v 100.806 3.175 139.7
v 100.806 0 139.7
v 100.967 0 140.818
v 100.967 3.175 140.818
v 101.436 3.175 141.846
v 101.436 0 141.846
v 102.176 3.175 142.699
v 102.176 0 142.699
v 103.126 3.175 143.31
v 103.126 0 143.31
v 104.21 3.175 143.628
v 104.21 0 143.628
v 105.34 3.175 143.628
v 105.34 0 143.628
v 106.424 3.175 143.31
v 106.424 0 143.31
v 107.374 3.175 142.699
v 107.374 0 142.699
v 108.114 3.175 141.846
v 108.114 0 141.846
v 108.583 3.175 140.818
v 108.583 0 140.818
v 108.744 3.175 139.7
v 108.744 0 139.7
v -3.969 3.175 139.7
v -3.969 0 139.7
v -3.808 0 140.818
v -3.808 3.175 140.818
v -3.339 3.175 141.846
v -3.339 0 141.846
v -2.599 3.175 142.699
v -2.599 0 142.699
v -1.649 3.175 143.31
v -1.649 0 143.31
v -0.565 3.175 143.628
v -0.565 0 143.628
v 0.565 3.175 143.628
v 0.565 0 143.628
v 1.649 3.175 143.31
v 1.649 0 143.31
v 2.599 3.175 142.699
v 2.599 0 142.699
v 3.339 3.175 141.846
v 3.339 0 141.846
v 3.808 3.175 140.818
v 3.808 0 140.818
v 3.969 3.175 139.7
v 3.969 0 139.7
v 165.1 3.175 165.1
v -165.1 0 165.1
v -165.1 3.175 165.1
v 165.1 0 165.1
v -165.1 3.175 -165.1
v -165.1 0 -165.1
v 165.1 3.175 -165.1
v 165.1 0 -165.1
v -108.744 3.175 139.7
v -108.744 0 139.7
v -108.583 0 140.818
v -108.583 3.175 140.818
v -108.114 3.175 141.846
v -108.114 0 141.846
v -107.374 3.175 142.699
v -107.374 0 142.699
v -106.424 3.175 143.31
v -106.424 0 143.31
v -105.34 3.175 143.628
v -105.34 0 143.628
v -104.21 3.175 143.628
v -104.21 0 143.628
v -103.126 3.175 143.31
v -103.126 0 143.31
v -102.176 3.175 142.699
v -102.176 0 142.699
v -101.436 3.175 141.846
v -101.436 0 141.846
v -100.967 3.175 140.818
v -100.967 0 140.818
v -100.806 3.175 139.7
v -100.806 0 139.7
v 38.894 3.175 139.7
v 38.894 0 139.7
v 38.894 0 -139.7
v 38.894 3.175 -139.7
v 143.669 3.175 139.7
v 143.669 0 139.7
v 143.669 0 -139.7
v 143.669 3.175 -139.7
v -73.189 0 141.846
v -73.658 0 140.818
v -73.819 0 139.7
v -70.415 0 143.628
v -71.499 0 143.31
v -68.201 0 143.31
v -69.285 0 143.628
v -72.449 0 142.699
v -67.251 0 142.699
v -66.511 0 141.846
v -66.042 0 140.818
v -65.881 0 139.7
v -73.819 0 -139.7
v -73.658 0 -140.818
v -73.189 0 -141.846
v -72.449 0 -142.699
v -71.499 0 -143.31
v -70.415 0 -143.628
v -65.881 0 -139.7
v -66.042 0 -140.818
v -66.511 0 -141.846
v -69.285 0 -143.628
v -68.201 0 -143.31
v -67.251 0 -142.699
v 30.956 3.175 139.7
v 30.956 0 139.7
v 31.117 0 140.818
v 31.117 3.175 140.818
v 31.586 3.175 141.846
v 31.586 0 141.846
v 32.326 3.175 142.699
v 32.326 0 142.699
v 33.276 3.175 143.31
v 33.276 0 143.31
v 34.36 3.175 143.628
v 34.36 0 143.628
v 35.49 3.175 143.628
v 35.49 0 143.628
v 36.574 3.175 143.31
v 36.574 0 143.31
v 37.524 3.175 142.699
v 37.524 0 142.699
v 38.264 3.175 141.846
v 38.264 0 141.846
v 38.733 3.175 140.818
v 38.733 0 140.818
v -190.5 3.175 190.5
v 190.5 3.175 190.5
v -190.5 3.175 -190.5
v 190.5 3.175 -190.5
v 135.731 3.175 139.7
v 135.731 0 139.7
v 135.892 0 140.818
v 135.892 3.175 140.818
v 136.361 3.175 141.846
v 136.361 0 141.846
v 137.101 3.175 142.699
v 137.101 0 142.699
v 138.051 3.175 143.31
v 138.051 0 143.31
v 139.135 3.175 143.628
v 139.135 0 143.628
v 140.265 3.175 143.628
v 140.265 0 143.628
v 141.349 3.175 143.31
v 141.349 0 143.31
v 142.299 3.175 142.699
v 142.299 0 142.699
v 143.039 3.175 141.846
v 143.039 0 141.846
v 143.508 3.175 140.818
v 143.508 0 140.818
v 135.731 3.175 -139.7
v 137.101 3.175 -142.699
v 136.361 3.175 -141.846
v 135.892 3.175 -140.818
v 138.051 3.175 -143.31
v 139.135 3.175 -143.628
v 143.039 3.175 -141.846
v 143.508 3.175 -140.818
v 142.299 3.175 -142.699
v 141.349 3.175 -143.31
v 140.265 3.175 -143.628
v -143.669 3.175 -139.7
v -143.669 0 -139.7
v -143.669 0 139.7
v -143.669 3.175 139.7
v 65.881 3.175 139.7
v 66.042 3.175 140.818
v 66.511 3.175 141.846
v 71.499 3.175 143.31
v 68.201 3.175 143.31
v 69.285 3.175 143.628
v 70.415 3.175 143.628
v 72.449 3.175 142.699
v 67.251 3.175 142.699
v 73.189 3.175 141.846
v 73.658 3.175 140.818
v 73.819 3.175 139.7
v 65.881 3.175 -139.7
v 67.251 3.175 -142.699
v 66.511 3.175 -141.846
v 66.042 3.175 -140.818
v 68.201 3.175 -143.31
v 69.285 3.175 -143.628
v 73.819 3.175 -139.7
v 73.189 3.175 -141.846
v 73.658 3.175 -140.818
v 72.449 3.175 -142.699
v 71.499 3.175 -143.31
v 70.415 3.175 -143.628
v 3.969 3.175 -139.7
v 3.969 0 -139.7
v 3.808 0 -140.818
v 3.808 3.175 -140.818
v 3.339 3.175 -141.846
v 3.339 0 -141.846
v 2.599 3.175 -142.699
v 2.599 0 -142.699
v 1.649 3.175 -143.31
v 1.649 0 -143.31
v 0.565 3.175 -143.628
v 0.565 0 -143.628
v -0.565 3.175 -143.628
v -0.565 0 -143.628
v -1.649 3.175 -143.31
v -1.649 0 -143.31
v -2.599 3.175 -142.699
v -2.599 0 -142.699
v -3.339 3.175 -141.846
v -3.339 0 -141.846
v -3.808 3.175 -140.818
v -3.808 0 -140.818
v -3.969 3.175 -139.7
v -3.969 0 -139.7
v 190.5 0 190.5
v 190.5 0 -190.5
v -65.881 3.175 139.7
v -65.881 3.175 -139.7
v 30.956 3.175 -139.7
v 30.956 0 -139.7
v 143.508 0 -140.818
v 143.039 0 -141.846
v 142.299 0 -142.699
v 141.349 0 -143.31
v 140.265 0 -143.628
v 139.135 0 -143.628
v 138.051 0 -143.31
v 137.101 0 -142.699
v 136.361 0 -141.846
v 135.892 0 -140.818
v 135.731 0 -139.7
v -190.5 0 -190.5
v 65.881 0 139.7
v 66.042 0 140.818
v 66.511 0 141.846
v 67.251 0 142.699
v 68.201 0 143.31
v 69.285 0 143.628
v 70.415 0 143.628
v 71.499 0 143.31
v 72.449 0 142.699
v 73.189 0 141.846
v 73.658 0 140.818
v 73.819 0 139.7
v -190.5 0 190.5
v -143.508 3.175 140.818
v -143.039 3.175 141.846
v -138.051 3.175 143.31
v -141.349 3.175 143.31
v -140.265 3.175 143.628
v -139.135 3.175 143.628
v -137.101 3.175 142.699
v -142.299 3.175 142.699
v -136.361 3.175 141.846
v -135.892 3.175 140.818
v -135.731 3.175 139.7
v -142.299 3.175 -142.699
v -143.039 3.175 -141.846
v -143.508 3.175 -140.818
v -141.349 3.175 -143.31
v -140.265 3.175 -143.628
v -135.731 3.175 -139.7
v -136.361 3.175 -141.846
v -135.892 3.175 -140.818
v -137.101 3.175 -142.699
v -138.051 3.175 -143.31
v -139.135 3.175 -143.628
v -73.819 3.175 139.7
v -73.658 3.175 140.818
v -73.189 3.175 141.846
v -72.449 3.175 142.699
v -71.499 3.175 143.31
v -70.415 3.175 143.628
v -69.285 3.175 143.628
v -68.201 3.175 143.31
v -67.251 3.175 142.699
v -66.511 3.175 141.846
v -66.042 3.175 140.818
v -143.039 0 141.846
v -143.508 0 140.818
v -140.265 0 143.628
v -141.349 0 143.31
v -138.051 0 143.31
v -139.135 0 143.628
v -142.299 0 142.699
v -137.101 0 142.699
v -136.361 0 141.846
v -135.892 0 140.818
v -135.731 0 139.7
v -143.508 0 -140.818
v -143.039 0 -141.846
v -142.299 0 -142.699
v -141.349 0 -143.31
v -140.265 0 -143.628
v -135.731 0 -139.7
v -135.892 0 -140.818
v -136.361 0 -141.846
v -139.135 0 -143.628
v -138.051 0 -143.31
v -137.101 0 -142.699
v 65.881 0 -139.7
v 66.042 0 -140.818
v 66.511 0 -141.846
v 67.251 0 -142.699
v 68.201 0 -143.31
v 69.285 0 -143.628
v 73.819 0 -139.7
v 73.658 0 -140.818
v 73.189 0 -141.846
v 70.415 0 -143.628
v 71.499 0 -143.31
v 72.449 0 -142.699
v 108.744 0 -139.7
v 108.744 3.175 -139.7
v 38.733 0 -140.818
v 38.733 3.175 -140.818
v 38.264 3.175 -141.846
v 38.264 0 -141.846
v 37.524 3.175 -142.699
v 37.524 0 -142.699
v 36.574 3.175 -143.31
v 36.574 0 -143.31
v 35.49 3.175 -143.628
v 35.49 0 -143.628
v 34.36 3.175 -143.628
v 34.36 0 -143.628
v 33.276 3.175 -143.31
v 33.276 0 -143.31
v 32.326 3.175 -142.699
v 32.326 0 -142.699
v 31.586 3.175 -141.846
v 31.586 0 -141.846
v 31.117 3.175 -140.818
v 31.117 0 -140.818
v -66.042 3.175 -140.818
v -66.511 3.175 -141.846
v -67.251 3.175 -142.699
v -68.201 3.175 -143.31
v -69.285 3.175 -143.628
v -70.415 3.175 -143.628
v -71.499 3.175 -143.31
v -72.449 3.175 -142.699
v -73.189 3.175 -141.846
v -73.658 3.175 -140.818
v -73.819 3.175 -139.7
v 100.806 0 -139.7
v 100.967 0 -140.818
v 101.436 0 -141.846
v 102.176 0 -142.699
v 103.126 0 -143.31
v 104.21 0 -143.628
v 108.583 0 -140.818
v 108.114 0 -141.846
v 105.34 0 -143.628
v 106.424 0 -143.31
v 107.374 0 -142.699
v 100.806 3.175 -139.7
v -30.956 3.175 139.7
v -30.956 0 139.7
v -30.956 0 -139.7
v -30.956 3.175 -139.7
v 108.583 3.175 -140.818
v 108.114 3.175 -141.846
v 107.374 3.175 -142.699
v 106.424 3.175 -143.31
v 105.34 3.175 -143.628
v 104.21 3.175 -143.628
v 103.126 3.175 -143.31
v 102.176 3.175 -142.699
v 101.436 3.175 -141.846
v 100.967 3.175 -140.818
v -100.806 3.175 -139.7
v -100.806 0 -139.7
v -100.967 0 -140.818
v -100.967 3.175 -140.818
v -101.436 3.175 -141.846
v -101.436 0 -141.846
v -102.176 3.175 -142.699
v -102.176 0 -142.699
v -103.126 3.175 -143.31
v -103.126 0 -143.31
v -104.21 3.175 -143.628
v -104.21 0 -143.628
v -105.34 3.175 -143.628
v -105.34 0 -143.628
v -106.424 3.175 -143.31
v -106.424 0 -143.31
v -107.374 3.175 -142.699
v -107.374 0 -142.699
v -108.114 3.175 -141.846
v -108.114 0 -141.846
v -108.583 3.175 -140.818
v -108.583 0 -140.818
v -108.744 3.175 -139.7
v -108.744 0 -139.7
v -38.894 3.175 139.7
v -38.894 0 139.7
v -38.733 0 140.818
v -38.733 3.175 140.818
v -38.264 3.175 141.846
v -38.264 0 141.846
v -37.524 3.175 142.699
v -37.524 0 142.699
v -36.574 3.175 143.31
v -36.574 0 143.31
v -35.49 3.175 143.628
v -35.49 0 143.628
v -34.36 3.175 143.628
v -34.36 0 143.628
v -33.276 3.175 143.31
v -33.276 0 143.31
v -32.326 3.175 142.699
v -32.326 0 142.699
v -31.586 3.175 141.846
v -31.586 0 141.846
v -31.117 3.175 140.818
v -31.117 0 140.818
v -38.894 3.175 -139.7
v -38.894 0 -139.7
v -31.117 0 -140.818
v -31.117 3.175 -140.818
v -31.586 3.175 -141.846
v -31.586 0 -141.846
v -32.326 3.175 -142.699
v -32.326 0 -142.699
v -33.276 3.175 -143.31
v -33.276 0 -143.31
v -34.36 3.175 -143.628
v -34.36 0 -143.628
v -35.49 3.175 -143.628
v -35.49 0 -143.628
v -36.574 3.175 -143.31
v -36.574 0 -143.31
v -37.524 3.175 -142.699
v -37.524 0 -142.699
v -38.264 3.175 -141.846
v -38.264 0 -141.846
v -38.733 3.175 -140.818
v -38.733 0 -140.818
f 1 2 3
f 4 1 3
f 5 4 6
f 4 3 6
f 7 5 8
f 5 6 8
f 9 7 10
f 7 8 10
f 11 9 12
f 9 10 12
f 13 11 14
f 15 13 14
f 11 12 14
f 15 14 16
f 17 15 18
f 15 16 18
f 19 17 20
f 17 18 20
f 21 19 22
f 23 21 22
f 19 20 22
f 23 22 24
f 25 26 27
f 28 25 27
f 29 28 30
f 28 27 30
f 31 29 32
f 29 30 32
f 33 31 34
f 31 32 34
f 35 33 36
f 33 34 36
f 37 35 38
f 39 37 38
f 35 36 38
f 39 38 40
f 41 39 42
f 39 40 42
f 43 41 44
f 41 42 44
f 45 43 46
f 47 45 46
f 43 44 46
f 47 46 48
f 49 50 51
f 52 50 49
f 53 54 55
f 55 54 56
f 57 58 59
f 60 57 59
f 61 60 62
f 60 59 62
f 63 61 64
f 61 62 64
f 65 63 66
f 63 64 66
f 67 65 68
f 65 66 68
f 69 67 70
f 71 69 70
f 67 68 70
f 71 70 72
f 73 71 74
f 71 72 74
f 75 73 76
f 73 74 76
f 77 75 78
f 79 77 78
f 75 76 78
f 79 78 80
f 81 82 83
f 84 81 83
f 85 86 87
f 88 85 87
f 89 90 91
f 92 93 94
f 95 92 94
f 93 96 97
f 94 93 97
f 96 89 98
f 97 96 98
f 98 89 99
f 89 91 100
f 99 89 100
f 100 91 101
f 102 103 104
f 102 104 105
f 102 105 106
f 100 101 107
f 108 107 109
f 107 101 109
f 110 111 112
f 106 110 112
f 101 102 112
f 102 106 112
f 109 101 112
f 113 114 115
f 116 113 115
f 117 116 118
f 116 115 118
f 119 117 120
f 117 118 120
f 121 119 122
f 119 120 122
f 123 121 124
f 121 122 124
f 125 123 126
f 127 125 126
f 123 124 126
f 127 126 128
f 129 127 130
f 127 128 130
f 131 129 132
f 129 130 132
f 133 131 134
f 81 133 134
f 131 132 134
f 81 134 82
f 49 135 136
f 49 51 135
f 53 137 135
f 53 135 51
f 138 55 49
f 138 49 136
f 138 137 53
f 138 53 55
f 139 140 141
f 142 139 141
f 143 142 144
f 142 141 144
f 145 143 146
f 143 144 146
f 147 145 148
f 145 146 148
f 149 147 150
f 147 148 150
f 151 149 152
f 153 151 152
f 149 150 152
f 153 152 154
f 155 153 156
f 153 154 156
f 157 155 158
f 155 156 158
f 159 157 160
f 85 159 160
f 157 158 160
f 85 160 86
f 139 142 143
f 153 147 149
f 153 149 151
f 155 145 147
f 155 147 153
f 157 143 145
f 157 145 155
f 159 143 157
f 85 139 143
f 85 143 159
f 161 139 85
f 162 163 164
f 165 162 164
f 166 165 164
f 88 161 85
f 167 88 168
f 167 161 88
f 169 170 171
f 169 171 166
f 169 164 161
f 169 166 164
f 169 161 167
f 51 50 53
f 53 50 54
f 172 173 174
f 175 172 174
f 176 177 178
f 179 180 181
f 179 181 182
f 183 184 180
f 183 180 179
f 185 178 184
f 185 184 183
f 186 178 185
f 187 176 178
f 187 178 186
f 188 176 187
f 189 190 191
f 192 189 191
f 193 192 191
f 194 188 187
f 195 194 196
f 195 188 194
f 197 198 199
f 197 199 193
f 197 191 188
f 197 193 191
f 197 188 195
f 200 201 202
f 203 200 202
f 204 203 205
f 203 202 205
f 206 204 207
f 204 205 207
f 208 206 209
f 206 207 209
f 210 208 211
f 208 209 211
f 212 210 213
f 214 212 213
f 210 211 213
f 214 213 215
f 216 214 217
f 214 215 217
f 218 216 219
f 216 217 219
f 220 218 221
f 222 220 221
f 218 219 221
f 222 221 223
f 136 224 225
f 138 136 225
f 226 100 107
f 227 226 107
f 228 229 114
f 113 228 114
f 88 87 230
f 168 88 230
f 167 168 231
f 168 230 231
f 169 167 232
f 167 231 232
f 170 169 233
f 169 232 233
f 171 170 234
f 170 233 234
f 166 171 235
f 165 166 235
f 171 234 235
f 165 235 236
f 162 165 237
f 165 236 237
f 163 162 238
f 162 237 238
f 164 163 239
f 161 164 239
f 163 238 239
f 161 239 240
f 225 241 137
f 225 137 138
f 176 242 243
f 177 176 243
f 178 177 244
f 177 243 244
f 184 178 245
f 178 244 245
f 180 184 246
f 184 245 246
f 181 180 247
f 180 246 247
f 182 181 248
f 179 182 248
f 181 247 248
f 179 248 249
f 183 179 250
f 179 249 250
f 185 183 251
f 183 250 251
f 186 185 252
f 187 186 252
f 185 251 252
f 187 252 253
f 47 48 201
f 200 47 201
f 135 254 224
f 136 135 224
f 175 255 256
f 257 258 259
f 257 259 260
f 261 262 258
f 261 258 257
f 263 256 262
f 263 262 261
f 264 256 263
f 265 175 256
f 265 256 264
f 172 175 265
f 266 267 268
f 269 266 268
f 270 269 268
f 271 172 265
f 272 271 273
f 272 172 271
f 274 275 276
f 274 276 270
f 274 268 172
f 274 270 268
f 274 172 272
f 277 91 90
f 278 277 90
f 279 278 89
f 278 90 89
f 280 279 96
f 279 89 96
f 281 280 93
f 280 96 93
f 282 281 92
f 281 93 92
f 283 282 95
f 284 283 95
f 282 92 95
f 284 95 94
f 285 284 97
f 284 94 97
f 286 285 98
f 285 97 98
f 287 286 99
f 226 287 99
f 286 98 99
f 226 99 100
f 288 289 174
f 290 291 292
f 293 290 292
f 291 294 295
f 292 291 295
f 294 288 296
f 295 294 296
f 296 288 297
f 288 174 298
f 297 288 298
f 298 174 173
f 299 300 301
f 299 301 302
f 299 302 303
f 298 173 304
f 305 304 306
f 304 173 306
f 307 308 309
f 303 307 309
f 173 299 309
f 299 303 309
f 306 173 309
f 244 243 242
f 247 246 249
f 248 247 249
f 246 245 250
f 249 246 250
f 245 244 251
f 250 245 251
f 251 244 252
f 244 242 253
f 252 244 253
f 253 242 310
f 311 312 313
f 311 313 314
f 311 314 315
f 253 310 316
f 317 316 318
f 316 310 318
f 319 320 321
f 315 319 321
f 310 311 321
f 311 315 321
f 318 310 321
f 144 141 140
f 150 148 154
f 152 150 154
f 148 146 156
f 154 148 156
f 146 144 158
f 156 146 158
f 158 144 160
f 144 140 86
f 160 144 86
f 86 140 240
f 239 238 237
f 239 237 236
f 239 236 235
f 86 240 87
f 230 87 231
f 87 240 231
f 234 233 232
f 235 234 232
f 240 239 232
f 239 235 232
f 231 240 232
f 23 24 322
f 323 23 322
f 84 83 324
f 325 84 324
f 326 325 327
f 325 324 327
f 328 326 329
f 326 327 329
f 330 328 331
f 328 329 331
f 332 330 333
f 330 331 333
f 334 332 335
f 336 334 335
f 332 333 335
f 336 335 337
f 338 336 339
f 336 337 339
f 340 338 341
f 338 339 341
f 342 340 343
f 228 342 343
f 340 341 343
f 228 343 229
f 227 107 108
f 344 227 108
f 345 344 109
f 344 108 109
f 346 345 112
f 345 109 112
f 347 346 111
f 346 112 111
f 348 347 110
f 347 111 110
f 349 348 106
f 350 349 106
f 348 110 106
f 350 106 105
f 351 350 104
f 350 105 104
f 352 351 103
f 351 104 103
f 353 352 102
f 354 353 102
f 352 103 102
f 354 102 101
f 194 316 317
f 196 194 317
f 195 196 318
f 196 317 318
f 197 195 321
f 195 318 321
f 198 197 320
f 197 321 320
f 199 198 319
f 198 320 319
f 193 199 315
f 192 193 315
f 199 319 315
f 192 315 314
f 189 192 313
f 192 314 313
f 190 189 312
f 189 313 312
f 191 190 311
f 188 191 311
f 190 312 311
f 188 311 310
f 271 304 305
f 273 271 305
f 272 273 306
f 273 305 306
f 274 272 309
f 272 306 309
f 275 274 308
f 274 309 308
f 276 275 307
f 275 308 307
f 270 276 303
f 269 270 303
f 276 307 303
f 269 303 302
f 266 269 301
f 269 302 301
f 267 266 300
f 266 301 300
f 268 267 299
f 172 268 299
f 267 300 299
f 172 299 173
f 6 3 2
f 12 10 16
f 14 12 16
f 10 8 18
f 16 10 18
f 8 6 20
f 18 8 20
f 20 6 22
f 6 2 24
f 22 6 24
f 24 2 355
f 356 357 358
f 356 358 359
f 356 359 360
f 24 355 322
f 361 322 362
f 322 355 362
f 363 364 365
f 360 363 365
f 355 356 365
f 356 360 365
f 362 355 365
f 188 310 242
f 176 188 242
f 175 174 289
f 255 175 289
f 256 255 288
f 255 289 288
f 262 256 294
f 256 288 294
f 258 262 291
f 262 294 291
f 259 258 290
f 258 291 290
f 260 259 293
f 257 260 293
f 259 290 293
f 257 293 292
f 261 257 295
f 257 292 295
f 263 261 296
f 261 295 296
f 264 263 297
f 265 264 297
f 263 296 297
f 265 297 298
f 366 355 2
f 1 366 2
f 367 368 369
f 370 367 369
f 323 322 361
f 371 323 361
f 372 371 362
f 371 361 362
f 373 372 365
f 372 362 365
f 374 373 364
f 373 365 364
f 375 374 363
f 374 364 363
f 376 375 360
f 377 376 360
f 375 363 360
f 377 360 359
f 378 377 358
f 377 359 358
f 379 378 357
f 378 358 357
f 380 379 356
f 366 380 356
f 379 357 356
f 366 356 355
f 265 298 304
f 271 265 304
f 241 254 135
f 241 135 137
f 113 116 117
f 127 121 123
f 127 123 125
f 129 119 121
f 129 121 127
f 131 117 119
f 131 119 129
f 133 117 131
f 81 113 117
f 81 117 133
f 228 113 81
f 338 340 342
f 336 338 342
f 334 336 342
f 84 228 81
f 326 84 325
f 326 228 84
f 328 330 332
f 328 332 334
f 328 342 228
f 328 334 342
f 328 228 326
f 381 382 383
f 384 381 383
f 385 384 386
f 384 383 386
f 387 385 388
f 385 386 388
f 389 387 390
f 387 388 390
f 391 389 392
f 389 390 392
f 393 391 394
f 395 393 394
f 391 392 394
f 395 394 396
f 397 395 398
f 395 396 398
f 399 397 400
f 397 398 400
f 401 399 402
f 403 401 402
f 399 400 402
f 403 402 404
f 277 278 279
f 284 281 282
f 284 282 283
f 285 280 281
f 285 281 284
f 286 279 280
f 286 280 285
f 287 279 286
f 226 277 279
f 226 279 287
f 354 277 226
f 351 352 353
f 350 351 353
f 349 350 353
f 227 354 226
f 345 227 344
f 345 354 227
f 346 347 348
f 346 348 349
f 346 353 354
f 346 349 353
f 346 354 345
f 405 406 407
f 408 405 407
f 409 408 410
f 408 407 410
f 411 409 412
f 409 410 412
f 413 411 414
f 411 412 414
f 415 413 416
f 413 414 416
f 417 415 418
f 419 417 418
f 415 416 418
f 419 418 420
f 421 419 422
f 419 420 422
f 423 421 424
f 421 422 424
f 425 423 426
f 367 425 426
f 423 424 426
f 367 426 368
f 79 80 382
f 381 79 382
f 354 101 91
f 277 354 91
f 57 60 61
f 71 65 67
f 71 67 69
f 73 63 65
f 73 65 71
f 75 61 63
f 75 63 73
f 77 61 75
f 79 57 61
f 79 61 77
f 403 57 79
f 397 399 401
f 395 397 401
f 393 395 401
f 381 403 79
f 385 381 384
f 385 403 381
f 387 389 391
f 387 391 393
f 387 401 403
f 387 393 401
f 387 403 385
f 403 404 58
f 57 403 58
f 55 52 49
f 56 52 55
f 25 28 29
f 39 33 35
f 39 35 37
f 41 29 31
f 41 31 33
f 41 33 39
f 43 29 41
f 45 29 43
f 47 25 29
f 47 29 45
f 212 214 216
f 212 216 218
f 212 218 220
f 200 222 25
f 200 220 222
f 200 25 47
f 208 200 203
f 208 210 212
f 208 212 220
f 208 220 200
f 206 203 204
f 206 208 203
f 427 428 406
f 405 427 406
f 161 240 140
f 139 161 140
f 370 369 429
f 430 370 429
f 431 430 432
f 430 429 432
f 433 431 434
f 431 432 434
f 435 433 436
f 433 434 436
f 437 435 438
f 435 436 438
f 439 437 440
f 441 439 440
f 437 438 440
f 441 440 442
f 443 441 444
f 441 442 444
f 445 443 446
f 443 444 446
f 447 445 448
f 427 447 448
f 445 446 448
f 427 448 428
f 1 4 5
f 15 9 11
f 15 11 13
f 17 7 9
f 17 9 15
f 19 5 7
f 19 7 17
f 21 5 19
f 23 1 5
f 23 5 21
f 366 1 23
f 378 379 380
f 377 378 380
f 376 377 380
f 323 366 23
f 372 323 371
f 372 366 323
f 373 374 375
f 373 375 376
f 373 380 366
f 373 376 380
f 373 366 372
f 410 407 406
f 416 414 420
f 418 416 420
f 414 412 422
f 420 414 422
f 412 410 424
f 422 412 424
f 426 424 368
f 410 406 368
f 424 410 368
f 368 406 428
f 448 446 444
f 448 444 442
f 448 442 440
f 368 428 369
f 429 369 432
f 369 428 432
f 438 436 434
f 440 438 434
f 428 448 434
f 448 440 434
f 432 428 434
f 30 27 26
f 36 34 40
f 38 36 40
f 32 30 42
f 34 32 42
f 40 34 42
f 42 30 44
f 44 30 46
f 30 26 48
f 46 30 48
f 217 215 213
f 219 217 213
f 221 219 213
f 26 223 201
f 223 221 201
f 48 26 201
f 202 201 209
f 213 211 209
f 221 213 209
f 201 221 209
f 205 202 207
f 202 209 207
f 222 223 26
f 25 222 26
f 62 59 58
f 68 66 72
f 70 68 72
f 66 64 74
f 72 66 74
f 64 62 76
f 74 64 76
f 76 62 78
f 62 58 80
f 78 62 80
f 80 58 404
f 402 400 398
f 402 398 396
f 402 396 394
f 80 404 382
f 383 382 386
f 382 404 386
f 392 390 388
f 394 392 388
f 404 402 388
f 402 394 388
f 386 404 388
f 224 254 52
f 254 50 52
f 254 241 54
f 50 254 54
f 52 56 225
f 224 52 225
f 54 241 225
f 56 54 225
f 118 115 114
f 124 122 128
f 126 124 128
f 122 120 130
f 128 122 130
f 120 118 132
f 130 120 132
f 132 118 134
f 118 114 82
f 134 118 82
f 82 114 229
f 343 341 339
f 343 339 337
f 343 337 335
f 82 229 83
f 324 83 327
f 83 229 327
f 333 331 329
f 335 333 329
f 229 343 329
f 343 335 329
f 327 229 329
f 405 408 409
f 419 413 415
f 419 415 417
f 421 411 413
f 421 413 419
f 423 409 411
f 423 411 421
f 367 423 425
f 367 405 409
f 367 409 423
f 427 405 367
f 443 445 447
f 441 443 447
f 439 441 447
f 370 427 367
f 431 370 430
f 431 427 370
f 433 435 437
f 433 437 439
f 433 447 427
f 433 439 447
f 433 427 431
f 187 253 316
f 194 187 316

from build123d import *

# Parameters (mm, degrees)
SKETCH1_W              = 381
SKETCH1_H              = 381
SKETCH1_W_2            = 330.2
SKETCH1_H_2            = 330.2
BOSS_EXTRUDE1_DEPTH    = 3.175
BOSS_EXTRUDE1_2_DEPTH  = 3.175
BOSS_EXTRUDE1_3_DEPTH  = 3.175
BOSS_EXTRUDE1_4_DEPTH  = 3.175
BOSS_EXTRUDE1_5_DEPTH  = 3.175
BOSS_EXTRUDE1_6_DEPTH  = 3.175
BOSS_EXTRUDE1_7_DEPTH  = 3.175
BOSS_EXTRUDE1_8_DEPTH  = 3.175
BOSS_EXTRUDE1_9_DEPTH  = 3.175
BOSS_EXTRUDE1_10_DEPTH = 3.175


with BuildPart() as part:
    # Sketch1 → Boss-Extrude1 (new body)
    with BuildSketch(Plane(origin=(0, 0, 0), x_dir=(1, 0, 0), z_dir=(0, 1, 0))):
        Rectangle(SKETCH1_W, SKETCH1_H)
        Rectangle(SKETCH1_W_2, SKETCH1_H_2, mode=Mode.SUBTRACT)
    extrude(amount=BOSS_EXTRUDE1_DEPTH)


with BuildPart() as body_2:
    # Sketch1 → Boss-Extrude1 2 (new body)
    with BuildSketch(Plane(origin=(0, 0, 0), x_dir=(1, 0, 0), z_dir=(0, 1, 0))):
        with BuildLine():
            Line((100.80625, 139.7), (100.80625, -139.7))
            ThreePointArc((100.80625, -139.7), (104.775, -143.66875), (108.74375, -139.7))
            Line((108.74375, -139.7), (108.74375, 139.7))
            ThreePointArc((108.74375, 139.7), (104.775, 143.66875), (100.80625, 139.7))
        make_face()
    extrude(amount=BOSS_EXTRUDE1_2_DEPTH)


with BuildPart() as body_3:
    # Sketch1 → Boss-Extrude1 3 (new body)
    with BuildSketch(Plane(origin=(0, 0, 0), x_dir=(1, 0, 0), z_dir=(0, 1, 0))):
        with BuildLine():
            Line((135.73125, 139.7), (135.73125, -139.7))
            ThreePointArc((135.73125, -139.7), (139.7, -143.66875), (143.66875, -139.7))
            Line((143.66875, -139.7), (143.66875, 139.7))
            ThreePointArc((143.66875, 139.7), (139.7, 143.66875), (135.73125, 139.7))
        make_face()
    extrude(amount=BOSS_EXTRUDE1_3_DEPTH)


with BuildPart() as body_4:
    # Sketch1 → Boss-Extrude1 4 (new body)
    with BuildSketch(Plane(origin=(0, 0, 0), x_dir=(1, 0, 0), z_dir=(0, 1, 0))):
        with BuildLine():
            Line((65.88125, 139.7), (65.88125, -139.7))
            ThreePointArc((65.88125, -139.7), (69.85, -143.66875), (73.81875, -139.7))
            Line((73.81875, -139.7), (73.81875, 139.7))
            ThreePointArc((73.81875, 139.7), (69.85, 143.66875), (65.88125, 139.7))
        make_face()
    extrude(amount=BOSS_EXTRUDE1_4_DEPTH)


with BuildPart() as body_5:
    # Sketch1 → Boss-Extrude1 5 (new body)
    with BuildSketch(Plane(origin=(0, 0, 0), x_dir=(1, 0, 0), z_dir=(0, 1, 0))):
        with BuildLine():
            Line((30.95625, 139.7), (30.95625, -139.7))
            ThreePointArc((30.95625, -139.7), (34.925, -143.66875), (38.89375, -139.7))
            Line((38.89375, -139.7), (38.89375, 139.7))
            ThreePointArc((38.89375, 139.7), (34.925, 143.66875), (30.95625, 139.7))
        make_face()
    extrude(amount=BOSS_EXTRUDE1_5_DEPTH)


with BuildPart() as body_6:
    # Sketch1 → Boss-Extrude1 6 (new body)
    with BuildSketch(Plane(origin=(0, 0, 0), x_dir=(1, 0, 0), z_dir=(0, 1, 0))):
        with BuildLine():
            Line((-3.96875, 139.7), (-3.96875, -139.7))
            ThreePointArc((-3.96875, -139.7), (0, -143.66875), (3.96875, -139.7))
            Line((3.96875, -139.7), (3.96875, 139.7))
            ThreePointArc((3.96875, 139.7), (0, 143.66875), (-3.96875, 139.7))
        make_face()
    extrude(amount=BOSS_EXTRUDE1_6_DEPTH)


with BuildPart() as body_7:
    # Sketch1 → Boss-Extrude1 7 (new body)
    with BuildSketch(Plane(origin=(0, 0, 0), x_dir=(1, 0, 0), z_dir=(0, 1, 0))):
        with BuildLine():
            Line((-73.81875, 139.7), (-73.81875, -139.7))
            ThreePointArc((-73.81875, -139.7), (-69.85, -143.66875), (-65.88125, -139.7))
            Line((-65.88125, -139.7), (-65.88125, 139.7))
            ThreePointArc((-65.88125, 139.7), (-69.85, 143.66875), (-73.81875, 139.7))
        make_face()
    extrude(amount=BOSS_EXTRUDE1_7_DEPTH)


with BuildPart() as body_8:
    # Sketch1 → Boss-Extrude1 8 (new body)
    with BuildSketch(Plane(origin=(0, 0, 0), x_dir=(1, 0, 0), z_dir=(0, 1, 0))):
        with BuildLine():
            Line((-38.89375, 139.7), (-38.89375, -139.7))
            ThreePointArc((-38.89375, -139.7), (-34.925, -143.66875), (-30.95625, -139.7))
            Line((-30.95625, -139.7), (-30.95625, 139.7))
            ThreePointArc((-30.95625, 139.7), (-34.925, 143.66875), (-38.89375, 139.7))
        make_face()
    extrude(amount=BOSS_EXTRUDE1_8_DEPTH)


with BuildPart() as body_9:
    # Sketch1 → Boss-Extrude1 9 (new body)
    with BuildSketch(Plane(origin=(0, 0, 0), x_dir=(1, 0, 0), z_dir=(0, 1, 0))):
        with BuildLine():
            Line((-108.74375, 139.7), (-108.74375, -139.7))
            ThreePointArc((-108.74375, -139.7), (-104.775, -143.66875), (-100.80625, -139.7))
            Line((-100.80625, -139.7), (-100.80625, 139.7))
            ThreePointArc((-100.80625, 139.7), (-104.775, 143.66875), (-108.74375, 139.7))
        make_face()
    extrude(amount=BOSS_EXTRUDE1_9_DEPTH)


with BuildPart() as body_10:
    # Sketch1 → Boss-Extrude1 10 (new body)
    with BuildSketch(Plane(origin=(0, 0, 0), x_dir=(1, 0, 0), z_dir=(0, 1, 0))):
        with BuildLine():
            Line((-143.66875, 139.7), (-143.66875, -139.7))
            ThreePointArc((-143.66875, -139.7), (-139.7, -143.66875), (-135.73125, -139.7))
            Line((-135.73125, -139.7), (-135.73125, 139.7))
            ThreePointArc((-135.73125, 139.7), (-139.7, 143.66875), (-143.66875, 139.7))
        make_face()
    extrude(amount=BOSS_EXTRUDE1_10_DEPTH)


solid = Compound([part.part, body_2.part, body_3.part, body_4.part, body_5.part, body_6.part, body_7.part, body_8.part, body_9.part, body_10.part])
